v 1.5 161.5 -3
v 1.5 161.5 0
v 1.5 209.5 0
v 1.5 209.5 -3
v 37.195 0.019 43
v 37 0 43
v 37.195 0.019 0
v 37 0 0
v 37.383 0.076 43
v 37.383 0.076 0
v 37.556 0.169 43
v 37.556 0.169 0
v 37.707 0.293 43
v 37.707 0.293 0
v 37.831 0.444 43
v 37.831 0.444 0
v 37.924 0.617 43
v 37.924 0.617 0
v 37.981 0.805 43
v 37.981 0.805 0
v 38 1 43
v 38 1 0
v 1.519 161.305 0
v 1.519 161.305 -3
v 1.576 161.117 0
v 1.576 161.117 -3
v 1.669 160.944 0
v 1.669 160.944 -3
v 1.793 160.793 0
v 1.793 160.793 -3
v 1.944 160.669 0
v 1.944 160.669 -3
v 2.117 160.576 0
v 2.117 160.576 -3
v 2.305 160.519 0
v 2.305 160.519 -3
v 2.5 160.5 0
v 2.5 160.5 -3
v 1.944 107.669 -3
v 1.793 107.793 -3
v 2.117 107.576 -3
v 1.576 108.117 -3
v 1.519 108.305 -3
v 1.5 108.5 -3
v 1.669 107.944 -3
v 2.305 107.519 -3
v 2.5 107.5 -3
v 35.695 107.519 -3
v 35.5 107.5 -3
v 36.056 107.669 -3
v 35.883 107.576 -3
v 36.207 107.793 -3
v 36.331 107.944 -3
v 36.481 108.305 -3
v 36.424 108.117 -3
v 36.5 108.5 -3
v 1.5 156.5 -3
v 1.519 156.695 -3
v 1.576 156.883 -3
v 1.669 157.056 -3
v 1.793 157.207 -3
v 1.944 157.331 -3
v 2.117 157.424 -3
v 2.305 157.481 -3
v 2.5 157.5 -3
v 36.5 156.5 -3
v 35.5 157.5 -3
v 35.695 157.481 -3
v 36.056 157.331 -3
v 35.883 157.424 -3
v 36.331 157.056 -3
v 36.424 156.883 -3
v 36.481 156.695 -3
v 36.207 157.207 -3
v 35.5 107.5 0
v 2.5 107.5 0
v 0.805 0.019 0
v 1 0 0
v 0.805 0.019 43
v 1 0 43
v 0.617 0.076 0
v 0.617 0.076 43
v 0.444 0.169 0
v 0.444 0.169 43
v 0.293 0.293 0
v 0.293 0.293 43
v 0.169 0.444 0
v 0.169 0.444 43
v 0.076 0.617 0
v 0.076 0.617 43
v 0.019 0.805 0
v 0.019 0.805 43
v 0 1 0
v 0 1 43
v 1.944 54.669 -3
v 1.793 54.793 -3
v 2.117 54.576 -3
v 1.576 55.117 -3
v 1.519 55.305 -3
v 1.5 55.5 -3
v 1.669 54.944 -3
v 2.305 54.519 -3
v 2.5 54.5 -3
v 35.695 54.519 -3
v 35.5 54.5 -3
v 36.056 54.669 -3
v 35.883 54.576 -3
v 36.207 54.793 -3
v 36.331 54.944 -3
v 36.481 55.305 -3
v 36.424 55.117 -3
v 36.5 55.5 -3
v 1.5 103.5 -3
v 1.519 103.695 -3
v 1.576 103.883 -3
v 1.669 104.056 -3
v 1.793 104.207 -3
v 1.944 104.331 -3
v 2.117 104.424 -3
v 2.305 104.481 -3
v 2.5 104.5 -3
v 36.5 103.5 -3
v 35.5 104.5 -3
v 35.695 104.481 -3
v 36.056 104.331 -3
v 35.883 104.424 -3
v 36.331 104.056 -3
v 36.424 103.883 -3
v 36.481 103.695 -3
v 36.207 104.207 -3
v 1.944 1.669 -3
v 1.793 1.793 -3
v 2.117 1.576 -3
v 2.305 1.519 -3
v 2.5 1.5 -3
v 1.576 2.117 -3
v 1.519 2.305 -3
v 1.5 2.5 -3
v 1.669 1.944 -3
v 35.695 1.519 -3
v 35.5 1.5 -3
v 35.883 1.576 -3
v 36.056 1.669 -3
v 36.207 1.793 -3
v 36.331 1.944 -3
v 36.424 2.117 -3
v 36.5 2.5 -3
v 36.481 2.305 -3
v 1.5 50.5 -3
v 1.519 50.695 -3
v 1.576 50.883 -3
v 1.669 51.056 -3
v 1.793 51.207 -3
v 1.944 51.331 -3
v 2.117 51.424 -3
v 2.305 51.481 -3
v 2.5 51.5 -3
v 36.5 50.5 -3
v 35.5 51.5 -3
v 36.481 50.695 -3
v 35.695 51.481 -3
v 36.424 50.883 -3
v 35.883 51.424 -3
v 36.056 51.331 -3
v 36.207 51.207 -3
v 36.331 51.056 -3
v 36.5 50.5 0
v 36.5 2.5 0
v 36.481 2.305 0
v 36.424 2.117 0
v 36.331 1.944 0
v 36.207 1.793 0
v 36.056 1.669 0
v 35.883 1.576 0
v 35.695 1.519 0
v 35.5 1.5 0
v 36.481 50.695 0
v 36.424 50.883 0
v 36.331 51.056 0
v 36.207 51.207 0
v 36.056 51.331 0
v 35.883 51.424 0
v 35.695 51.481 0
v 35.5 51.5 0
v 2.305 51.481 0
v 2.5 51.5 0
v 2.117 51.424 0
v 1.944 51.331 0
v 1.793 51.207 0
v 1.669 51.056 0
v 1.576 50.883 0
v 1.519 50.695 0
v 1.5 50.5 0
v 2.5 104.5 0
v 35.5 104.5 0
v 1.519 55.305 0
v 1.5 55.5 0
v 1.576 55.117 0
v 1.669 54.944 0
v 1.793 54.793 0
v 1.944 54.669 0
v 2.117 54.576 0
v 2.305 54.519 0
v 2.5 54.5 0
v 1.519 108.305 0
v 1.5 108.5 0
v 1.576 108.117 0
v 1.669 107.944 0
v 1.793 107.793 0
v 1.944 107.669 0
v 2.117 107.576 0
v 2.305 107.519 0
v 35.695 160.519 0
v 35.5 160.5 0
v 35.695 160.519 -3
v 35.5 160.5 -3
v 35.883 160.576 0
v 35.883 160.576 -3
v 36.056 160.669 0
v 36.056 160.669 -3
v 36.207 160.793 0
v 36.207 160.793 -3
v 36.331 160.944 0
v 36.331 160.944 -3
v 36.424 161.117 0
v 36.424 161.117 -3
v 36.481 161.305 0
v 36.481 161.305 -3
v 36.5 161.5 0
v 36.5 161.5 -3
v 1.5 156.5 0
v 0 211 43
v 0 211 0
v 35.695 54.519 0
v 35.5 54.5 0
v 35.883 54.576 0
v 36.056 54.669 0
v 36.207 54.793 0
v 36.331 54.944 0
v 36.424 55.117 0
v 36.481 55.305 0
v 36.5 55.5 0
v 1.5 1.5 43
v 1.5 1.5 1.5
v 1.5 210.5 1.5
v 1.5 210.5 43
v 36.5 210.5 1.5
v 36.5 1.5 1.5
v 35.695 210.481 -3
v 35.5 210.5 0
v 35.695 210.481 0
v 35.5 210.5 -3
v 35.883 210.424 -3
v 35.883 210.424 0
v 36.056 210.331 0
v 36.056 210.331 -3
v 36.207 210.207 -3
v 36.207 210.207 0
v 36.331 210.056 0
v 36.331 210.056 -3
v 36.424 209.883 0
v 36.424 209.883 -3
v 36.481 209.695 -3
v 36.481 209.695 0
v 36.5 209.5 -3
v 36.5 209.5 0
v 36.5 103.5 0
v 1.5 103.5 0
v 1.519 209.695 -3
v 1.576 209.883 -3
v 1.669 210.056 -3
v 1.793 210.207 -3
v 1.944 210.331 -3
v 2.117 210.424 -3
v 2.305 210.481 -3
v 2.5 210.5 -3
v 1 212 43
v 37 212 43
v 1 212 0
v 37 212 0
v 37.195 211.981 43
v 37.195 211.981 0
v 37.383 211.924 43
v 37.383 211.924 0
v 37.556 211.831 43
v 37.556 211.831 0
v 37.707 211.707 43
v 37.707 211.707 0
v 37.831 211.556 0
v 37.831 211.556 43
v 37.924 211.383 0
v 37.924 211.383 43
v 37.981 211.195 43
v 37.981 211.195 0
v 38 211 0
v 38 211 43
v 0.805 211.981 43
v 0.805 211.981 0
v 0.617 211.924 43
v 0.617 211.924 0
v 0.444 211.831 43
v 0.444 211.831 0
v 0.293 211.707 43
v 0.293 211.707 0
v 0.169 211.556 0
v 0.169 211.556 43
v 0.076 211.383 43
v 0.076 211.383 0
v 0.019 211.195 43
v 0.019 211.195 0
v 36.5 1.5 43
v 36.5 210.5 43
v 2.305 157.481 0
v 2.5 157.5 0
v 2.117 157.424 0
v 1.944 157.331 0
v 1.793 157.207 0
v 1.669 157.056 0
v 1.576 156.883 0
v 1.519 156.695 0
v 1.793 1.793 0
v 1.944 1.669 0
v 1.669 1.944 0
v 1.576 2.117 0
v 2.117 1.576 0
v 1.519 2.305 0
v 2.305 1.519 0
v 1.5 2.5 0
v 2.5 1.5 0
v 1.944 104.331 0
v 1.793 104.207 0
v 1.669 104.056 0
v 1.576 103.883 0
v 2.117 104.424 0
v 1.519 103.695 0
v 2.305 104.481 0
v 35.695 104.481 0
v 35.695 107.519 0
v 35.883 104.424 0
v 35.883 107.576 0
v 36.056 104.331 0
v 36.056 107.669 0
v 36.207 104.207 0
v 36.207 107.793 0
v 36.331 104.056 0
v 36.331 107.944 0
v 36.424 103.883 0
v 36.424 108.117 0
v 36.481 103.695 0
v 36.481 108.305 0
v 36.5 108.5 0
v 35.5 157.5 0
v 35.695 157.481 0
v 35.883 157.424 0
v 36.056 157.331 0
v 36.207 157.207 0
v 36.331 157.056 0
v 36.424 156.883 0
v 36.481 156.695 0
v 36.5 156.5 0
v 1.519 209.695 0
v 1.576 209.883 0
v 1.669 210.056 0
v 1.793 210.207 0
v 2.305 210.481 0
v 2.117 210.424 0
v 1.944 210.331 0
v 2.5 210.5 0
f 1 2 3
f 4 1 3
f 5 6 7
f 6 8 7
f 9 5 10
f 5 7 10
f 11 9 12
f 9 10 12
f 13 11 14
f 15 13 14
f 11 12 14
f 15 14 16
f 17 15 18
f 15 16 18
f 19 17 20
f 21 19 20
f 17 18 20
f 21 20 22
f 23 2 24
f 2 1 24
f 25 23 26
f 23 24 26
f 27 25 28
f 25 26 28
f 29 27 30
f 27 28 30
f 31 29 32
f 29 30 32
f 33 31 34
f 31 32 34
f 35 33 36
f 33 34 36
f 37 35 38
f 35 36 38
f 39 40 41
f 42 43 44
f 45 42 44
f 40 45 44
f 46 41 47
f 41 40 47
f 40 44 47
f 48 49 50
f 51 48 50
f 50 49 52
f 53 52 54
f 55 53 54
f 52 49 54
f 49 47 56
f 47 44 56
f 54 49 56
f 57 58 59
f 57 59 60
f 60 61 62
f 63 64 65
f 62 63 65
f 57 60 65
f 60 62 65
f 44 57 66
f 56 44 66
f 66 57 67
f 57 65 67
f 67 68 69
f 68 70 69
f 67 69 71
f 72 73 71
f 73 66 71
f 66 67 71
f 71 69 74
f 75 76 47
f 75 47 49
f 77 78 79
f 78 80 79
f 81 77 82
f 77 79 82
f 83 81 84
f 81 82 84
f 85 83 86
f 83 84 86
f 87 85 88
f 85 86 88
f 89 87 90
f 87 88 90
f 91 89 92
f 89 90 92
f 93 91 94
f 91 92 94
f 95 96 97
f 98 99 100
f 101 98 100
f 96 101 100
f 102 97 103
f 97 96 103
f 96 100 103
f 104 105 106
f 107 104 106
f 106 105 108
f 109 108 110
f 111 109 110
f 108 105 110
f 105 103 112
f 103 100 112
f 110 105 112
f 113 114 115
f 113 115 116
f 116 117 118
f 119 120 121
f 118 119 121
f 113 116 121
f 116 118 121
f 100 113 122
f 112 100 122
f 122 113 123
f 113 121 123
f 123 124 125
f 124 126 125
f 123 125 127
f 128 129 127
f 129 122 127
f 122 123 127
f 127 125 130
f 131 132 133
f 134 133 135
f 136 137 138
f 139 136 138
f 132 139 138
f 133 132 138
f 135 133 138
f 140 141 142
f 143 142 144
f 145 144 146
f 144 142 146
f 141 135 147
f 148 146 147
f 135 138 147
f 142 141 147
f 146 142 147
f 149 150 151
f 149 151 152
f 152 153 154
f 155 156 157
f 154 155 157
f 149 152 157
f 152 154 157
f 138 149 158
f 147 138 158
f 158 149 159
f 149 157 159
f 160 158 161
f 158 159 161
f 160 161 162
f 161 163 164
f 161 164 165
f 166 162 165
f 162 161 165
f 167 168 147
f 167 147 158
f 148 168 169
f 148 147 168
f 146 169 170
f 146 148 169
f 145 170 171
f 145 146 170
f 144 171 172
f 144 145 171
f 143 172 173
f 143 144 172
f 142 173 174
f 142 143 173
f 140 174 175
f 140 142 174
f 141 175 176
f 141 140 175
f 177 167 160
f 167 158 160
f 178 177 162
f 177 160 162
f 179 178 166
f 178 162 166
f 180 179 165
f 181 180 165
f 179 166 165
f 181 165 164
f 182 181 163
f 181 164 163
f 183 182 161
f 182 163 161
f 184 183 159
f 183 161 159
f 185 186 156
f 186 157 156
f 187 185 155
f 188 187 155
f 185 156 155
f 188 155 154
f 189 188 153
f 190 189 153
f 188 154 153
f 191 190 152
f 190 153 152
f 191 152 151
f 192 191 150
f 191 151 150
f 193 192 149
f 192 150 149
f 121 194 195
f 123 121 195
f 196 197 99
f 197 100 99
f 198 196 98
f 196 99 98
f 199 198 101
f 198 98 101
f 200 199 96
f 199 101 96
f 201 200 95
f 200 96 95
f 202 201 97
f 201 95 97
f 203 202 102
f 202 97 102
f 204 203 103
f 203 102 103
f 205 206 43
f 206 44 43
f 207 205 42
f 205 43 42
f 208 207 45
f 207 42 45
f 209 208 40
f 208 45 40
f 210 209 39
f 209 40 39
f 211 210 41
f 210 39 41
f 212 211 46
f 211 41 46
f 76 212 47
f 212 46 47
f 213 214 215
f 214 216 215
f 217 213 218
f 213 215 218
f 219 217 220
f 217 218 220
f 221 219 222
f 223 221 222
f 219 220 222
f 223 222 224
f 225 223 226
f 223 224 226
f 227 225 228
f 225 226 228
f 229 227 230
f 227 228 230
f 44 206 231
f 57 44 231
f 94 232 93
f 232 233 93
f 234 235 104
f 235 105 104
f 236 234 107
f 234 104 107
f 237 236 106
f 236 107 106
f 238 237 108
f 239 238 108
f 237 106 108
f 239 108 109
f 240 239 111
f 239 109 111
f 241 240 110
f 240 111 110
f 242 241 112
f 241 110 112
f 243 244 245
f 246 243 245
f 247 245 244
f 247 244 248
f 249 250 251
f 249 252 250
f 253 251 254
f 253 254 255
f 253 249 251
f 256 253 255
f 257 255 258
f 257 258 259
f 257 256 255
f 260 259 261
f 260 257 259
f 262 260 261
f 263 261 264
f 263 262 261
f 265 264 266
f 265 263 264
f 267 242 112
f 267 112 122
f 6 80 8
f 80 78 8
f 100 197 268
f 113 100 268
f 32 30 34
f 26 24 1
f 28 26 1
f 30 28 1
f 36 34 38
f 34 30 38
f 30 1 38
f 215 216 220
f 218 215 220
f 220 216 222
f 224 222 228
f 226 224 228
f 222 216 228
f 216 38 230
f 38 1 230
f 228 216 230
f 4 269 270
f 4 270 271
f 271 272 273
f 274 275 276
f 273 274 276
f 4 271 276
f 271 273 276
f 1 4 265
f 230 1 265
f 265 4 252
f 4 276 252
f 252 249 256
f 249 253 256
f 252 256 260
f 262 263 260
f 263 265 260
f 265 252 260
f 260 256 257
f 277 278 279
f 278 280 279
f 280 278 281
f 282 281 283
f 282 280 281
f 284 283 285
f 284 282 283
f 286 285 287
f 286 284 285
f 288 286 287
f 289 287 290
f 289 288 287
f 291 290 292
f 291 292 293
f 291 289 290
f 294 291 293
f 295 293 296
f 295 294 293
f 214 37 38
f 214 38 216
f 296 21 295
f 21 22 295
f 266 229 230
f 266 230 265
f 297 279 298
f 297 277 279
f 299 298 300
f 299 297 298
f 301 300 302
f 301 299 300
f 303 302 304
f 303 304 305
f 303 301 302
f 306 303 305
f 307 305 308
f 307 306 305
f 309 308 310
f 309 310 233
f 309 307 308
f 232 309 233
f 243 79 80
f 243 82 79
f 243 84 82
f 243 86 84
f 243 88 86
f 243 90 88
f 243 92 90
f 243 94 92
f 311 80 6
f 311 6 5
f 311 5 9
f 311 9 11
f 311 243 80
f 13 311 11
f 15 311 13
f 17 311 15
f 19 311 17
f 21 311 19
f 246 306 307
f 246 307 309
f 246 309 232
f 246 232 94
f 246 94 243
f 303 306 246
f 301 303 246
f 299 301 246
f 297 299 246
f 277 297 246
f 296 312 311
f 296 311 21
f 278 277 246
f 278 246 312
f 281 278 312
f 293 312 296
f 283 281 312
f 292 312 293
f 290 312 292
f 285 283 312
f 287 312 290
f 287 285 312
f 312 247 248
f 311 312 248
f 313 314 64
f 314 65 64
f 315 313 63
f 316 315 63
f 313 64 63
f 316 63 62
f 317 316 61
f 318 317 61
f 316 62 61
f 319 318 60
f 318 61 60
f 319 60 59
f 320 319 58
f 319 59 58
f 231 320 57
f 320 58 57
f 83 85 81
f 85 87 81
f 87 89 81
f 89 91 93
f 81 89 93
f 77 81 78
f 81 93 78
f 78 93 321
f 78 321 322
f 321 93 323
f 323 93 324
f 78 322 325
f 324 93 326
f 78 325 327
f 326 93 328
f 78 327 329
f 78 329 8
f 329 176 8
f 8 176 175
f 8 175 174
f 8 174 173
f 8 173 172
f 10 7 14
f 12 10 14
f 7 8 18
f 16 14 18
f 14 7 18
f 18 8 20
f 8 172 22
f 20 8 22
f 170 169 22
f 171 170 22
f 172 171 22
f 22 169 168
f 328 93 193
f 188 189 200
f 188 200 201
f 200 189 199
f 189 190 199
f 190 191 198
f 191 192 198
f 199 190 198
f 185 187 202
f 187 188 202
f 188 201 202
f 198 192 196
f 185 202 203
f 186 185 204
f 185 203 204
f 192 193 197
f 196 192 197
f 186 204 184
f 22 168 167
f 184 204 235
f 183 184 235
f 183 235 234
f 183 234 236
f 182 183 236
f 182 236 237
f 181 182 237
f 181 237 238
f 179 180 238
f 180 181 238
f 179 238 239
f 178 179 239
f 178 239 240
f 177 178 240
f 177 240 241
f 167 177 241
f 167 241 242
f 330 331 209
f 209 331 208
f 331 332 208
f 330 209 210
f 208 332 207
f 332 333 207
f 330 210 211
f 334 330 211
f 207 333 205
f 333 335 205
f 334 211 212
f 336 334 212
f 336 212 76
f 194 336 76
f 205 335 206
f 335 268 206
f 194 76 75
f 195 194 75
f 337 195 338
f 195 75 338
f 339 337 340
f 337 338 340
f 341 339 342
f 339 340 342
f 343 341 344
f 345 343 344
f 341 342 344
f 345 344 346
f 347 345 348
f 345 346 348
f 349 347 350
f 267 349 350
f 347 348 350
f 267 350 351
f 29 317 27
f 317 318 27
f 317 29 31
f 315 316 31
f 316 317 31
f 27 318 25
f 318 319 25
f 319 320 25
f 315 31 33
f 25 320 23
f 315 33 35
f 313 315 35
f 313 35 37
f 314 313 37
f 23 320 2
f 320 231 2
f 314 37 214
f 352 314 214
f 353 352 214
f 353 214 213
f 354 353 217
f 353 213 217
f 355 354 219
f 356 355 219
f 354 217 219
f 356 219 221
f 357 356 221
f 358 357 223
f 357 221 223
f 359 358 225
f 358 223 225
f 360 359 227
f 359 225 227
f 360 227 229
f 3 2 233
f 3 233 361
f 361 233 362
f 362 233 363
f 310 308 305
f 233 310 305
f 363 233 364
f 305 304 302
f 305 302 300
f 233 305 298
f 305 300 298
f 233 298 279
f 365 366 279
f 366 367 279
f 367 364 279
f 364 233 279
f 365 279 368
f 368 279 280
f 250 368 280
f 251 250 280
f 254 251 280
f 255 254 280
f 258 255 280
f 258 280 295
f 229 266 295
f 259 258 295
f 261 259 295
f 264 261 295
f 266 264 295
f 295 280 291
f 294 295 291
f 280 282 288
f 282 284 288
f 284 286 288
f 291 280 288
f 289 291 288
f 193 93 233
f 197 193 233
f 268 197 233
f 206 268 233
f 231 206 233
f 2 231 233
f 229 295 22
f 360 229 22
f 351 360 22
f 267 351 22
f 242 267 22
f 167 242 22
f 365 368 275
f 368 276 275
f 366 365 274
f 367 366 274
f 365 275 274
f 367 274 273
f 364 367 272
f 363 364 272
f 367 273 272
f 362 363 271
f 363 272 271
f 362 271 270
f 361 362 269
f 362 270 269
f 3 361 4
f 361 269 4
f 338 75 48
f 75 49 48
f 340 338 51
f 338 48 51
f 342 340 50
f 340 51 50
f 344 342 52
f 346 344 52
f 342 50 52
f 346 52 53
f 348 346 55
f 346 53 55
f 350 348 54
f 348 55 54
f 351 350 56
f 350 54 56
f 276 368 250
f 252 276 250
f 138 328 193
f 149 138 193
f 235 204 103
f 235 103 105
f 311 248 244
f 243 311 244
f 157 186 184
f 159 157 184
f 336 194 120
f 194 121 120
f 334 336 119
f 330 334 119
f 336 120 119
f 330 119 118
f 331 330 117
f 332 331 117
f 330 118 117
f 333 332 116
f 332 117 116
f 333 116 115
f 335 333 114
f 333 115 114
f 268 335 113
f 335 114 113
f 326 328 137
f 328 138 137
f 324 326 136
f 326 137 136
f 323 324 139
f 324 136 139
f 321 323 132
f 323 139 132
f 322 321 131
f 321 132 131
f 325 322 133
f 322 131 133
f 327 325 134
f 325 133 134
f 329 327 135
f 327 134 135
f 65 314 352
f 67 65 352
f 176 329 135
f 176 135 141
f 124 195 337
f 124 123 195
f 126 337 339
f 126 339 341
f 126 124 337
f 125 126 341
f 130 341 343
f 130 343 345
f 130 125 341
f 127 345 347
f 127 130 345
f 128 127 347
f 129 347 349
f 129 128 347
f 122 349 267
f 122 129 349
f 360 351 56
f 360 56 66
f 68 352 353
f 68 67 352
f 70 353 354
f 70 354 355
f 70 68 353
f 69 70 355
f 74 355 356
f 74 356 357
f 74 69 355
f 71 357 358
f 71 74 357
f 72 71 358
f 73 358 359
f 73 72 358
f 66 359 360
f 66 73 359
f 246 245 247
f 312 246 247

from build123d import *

# Parameters (mm, degrees)
F0_W     = 35
F0_H     = 50
F1_DEPTH = 3
F0_H_2   = 1.5
F2_DEPTH = 1.5
F3_DEPTH = 43
F4_R     = 1


with BuildPart() as f1:
    # F0 (on Top) → F1 (new body)
    with BuildSketch(Plane.XY):
        with Locations((19, 185.5)):
            Rectangle(F0_W, F0_H)
        with Locations((19, 132.5)):
            Rectangle(F0_W, F0_H)
        with Locations((19, 79.5)):
            Rectangle(F0_W, F0_H)
        with Locations((19, 26.5)):
            Rectangle(F0_W, F0_H)
    extrude(amount=-F1_DEPTH)

    # F0 (on Top) → F2 (join)
    with BuildSketch(Plane.XY):
        with Locations((19, 185.5)):
            Rectangle(F0_W, F0_H)
        Polygon((0, 212), (0, 159), (1.5, 159), (1.5, 160.5), (1.5, 210.5), (36.5, 210.5), (36.5, 160.5), (36.5, 159), (38, 159), (38, 212), align=None)
        with Locations((19, 132.5)):
            Rectangle(F0_W, F0_H)
        Polygon((36.5, 106), (38, 106), (38, 159), (36.5, 159), (36.5, 157.5), (36.5, 107.5), align=None)
        with Locations((19, 158.25)):
            Rectangle(F0_W, F0_H_2)
        with Locations((19, 159.75)):
            Rectangle(F0_W, F0_H_2)
        Polygon((0, 159), (0, 106), (1.5, 106), (1.5, 107.5), (1.5, 157.5), (1.5, 159), align=None)
        with Locations((19, 105.25)):
            Rectangle(F0_W, F0_H_2)
        with Locations((19, 106.75)):
            Rectangle(F0_W, F0_H_2)
        Polygon((36.5, 53), (38, 53), (38, 106), (36.5, 106), (36.5, 104.5), (36.5, 54.5), align=None)
        with Locations((19, 79.5)):
            Rectangle(F0_W, F0_H)
        Polygon((0, 106), (0, 53), (1.5, 53), (1.5, 54.5), (1.5, 104.5), (1.5, 106), align=None)
        Polygon((0, 53), (0, 0), (38, 0), (38, 53), (36.5, 53), (36.5, 51.5), (36.5, 1.5), (1.5, 1.5), (1.5, 51.5), (1.5, 53), align=None)
        with Locations((19, 26.5)):
            Rectangle(F0_W, F0_H)
        with Locations((19, 52.25)):
            Rectangle(F0_W, F0_H_2)
        with Locations((19, 53.75)):
            Rectangle(F0_W, F0_H_2)
    extrude(amount=F2_DEPTH)

    # F0 (on Top) → F3 (join)
    with BuildSketch(Plane.XY):
        Polygon((0, 53), (0, 0), (38, 0), (38, 53), (36.5, 53), (36.5, 51.5), (36.5, 1.5), (1.5, 1.5), (1.5, 51.5), (1.5, 53), align=None)
        Polygon((0, 106), (0, 53), (1.5, 53), (1.5, 54.5), (1.5, 104.5), (1.5, 106), align=None)
        Polygon((36.5, 53), (38, 53), (38, 106), (36.5, 106), (36.5, 104.5), (36.5, 54.5), align=None)
        Polygon((36.5, 106), (38, 106), (38, 159), (36.5, 159), (36.5, 157.5), (36.5, 107.5), align=None)
        Polygon((0, 159), (0, 106), (1.5, 106), (1.5, 107.5), (1.5, 157.5), (1.5, 159), align=None)
        Polygon((0, 212), (0, 159), (1.5, 159), (1.5, 160.5), (1.5, 210.5), (36.5, 210.5), (36.5, 160.5), (36.5, 159), (38, 159), (38, 212), align=None)
    extrude(amount=F3_DEPTH)

    # F4
    f4_edges = [f1.edges().sort_by_distance(p)[0] for p in [
        (38, 212, 21.5),
        (0, 212, 21.5),
        (1.5, 210.5, -1.5),
        (36.5, 210.5, -1.5),
        (1.5, 160.5, -1.5),
        (36.5, 160.5, -1.5),
        (36.5, 157.5, -1.5),
        (1.5, 157.5, -1.5),
        (1.5, 107.5, -1.5),
        (36.5, 107.5, -1.5),
        (36.5, 104.5, -1.5),
        (1.5, 104.5, -1.5),
        (1.5, 54.5, -1.5),
        (36.5, 54.5, -1.5),
        (36.5, 51.5, -1.5),
        (1.5, 51.5, -1.5),
        (1.5, 1.5, -1.5),
        (36.5, 1.5, -1.5),
        (38, 0, 21.5),
        (0, 0, 21.5),
    ]]
    fillet(f4_edges, radius=F4_R)


solid = f1.part
